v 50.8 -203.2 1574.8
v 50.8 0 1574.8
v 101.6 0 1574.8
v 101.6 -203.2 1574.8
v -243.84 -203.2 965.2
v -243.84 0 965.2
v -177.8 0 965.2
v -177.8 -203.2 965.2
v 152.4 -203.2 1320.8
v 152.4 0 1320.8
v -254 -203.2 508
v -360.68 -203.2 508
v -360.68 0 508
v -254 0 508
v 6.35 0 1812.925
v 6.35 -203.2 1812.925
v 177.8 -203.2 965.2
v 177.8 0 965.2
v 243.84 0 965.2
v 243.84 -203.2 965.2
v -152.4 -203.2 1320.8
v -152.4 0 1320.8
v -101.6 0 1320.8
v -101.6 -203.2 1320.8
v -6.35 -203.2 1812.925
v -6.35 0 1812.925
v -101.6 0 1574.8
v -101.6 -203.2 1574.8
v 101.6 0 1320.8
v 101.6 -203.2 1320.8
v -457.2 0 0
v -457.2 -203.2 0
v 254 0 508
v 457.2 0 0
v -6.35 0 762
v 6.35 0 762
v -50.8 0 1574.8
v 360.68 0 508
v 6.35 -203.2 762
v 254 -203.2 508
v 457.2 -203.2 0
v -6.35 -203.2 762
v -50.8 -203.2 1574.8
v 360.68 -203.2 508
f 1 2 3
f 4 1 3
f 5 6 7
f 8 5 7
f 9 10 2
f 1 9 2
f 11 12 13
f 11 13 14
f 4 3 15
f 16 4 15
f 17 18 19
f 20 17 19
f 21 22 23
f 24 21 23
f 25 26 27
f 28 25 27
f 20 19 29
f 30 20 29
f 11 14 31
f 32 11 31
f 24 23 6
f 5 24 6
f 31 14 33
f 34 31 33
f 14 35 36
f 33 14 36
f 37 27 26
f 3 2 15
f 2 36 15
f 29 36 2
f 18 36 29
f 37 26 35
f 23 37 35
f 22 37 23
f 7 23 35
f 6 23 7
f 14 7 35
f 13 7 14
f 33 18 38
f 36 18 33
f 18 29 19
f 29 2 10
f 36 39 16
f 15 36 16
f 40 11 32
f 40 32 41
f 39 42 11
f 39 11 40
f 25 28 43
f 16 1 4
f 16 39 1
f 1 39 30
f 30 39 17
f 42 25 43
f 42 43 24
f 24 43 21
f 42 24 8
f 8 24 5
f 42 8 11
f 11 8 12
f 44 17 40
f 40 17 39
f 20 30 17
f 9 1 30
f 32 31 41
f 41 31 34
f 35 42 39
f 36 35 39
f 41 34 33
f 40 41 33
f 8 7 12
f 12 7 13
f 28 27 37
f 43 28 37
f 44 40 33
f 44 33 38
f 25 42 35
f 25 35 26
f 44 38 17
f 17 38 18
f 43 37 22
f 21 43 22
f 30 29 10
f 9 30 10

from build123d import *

# Parameters (mm, degrees)
F1_DEPTH = 203.2
F3_W     = 12.7
F3_H     = 1143
F4_DEPTH = 203.201


with BuildPart() as f1:
    # F0 (on Front) → F1 (new body)
    with BuildSketch(Plane.XZ):
        Polygon((101.6, 1574.8), (0, 1828.8), (-101.6, 1574.8), (-50.8, 1574.8), (-152.4, 1320.8), (-101.6, 1320.8), (-243.84, 965.2), (-177.8, 965.2), (-360.68, 508), (-254, 508), (-457.2, 0), (457.2, 0), (254, 508), (360.68, 508), (177.8, 965.2), (243.84, 965.2), (101.6, 1320.8), (152.4, 1320.8), (50.8, 1574.8), align=None)
    extrude(amount=F1_DEPTH)

    # F3 (on face) → F4 (cut, through all)
    with BuildSketch(Plane.XZ.offset(203.2)):
        with Locations((0, 1333.5)):
            Rectangle(F3_W, F3_H)
    extrude(amount=-F4_DEPTH, mode=Mode.SUBTRACT)


solid = f1.part
